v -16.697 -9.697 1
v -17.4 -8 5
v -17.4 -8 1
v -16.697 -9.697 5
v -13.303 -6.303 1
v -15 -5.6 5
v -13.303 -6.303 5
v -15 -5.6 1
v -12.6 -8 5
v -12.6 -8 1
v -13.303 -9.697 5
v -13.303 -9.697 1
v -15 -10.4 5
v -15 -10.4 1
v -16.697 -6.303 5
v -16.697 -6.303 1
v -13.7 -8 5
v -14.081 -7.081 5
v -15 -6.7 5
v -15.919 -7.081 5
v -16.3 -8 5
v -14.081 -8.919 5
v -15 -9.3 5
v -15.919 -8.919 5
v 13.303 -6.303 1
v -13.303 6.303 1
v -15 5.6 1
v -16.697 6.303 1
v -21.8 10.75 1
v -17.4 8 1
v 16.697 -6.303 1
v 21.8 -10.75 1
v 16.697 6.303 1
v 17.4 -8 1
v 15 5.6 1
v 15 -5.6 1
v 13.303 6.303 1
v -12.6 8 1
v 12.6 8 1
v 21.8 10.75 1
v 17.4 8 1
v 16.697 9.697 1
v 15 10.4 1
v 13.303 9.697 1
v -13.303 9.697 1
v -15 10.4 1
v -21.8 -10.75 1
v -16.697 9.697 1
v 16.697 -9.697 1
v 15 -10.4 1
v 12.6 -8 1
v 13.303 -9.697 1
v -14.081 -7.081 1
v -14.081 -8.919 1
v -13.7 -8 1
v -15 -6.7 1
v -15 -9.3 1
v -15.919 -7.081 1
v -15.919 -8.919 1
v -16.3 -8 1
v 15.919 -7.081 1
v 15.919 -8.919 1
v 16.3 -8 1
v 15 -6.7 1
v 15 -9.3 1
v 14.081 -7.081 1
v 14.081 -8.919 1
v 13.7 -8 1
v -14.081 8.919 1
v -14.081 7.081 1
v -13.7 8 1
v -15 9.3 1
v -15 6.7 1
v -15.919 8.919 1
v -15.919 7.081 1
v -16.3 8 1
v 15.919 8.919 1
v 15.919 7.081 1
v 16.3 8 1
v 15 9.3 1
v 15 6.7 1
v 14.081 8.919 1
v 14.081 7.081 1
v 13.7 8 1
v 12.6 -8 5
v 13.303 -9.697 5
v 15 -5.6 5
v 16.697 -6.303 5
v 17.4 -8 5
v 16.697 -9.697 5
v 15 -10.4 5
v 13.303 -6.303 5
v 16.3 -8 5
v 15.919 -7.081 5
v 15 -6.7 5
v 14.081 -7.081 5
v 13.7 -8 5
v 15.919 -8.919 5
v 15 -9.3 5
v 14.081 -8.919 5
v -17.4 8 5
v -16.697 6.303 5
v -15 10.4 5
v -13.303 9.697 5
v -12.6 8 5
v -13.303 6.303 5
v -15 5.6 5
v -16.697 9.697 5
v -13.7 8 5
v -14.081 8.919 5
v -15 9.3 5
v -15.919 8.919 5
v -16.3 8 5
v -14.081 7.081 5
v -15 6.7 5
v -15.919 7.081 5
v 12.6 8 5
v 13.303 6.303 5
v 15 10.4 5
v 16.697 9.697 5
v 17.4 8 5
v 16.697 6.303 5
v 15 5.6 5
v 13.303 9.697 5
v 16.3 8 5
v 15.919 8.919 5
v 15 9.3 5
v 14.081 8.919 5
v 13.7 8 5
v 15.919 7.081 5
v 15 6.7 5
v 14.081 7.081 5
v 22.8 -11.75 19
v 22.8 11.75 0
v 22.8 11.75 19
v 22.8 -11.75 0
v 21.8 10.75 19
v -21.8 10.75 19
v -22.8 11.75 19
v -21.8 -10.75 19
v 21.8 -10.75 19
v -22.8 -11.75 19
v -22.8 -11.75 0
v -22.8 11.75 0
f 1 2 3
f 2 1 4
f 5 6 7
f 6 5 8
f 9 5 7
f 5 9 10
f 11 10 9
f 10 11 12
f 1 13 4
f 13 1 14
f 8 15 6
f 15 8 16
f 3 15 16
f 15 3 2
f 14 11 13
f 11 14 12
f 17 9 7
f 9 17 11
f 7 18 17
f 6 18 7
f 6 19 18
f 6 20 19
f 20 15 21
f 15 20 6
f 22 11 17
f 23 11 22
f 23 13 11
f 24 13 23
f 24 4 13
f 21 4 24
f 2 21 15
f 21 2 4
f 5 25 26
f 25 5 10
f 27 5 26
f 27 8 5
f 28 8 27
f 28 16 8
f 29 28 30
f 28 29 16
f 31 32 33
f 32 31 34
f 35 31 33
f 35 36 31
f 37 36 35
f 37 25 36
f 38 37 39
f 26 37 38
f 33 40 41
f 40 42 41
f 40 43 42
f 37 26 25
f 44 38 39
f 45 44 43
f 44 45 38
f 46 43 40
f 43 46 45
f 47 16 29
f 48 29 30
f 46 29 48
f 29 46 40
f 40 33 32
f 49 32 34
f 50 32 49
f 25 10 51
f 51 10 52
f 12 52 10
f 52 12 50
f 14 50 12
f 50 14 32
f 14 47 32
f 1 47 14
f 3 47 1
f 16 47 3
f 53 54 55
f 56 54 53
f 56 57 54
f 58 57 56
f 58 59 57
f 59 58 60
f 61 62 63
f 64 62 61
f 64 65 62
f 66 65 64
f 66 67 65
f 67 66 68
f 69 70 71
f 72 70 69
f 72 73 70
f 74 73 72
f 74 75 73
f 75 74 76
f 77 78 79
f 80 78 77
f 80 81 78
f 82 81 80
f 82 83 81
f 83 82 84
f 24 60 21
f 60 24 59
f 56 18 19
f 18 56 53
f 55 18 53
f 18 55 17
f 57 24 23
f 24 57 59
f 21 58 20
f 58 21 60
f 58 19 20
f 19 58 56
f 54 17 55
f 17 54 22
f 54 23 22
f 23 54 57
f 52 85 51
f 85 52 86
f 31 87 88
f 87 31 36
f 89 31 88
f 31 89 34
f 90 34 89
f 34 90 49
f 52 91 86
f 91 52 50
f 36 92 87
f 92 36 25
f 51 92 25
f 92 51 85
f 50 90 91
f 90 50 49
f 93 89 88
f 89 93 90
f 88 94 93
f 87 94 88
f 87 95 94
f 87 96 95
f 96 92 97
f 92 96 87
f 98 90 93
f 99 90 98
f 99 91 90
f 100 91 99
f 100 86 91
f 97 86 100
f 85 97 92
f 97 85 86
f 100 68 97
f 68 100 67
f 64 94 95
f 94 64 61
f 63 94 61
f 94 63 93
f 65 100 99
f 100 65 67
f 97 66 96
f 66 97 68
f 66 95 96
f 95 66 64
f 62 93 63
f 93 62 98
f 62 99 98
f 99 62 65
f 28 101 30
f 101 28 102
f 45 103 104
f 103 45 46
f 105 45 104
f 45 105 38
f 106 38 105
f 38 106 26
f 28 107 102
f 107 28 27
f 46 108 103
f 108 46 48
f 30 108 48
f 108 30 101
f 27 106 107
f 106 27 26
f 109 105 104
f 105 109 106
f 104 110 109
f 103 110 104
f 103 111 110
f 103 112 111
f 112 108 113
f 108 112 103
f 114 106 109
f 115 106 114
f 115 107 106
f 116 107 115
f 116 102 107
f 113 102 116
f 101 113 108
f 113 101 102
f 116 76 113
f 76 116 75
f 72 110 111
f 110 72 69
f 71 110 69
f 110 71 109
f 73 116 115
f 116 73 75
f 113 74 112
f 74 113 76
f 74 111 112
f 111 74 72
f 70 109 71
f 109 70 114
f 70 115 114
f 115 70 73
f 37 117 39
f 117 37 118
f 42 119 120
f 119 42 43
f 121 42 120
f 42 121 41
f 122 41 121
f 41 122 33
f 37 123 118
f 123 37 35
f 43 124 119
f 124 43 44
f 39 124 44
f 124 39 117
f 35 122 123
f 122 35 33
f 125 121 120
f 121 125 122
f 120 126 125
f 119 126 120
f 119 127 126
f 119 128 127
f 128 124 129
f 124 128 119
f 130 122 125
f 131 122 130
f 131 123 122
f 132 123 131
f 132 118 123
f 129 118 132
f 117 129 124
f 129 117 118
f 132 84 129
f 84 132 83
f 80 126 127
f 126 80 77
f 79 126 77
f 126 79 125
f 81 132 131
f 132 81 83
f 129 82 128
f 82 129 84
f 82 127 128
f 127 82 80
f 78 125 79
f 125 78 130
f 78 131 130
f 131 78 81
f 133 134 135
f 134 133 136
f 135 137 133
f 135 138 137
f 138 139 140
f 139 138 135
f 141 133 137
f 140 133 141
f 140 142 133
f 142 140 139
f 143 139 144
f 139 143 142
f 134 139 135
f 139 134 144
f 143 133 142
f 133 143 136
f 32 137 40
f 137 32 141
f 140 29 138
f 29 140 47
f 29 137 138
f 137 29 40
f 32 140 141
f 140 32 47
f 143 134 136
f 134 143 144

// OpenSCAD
width = 43.2;
length = 21.1;
height = 12.2;
hole_diameter = 2.8;

translate([0,0,0.5]){
    cube([width+2.4,length+2.4,1],center=true);
}

for(y=[-1,1]){
    for(x=[-1,1]){
        translate([x*15,y*8,1]){
            difference(){
                cylinder(h=4,d=4.8,$fn=8);
                cylinder(h=4.01,d=2.6,$fn=8);
            }
        }
    }
}

translate([0,0,10]){
    difference(){
        cube([width+2.4,length+2.4,18], center=true);
        cube([width+0.4,length+0.4,18.2], center=true);
    }
}
